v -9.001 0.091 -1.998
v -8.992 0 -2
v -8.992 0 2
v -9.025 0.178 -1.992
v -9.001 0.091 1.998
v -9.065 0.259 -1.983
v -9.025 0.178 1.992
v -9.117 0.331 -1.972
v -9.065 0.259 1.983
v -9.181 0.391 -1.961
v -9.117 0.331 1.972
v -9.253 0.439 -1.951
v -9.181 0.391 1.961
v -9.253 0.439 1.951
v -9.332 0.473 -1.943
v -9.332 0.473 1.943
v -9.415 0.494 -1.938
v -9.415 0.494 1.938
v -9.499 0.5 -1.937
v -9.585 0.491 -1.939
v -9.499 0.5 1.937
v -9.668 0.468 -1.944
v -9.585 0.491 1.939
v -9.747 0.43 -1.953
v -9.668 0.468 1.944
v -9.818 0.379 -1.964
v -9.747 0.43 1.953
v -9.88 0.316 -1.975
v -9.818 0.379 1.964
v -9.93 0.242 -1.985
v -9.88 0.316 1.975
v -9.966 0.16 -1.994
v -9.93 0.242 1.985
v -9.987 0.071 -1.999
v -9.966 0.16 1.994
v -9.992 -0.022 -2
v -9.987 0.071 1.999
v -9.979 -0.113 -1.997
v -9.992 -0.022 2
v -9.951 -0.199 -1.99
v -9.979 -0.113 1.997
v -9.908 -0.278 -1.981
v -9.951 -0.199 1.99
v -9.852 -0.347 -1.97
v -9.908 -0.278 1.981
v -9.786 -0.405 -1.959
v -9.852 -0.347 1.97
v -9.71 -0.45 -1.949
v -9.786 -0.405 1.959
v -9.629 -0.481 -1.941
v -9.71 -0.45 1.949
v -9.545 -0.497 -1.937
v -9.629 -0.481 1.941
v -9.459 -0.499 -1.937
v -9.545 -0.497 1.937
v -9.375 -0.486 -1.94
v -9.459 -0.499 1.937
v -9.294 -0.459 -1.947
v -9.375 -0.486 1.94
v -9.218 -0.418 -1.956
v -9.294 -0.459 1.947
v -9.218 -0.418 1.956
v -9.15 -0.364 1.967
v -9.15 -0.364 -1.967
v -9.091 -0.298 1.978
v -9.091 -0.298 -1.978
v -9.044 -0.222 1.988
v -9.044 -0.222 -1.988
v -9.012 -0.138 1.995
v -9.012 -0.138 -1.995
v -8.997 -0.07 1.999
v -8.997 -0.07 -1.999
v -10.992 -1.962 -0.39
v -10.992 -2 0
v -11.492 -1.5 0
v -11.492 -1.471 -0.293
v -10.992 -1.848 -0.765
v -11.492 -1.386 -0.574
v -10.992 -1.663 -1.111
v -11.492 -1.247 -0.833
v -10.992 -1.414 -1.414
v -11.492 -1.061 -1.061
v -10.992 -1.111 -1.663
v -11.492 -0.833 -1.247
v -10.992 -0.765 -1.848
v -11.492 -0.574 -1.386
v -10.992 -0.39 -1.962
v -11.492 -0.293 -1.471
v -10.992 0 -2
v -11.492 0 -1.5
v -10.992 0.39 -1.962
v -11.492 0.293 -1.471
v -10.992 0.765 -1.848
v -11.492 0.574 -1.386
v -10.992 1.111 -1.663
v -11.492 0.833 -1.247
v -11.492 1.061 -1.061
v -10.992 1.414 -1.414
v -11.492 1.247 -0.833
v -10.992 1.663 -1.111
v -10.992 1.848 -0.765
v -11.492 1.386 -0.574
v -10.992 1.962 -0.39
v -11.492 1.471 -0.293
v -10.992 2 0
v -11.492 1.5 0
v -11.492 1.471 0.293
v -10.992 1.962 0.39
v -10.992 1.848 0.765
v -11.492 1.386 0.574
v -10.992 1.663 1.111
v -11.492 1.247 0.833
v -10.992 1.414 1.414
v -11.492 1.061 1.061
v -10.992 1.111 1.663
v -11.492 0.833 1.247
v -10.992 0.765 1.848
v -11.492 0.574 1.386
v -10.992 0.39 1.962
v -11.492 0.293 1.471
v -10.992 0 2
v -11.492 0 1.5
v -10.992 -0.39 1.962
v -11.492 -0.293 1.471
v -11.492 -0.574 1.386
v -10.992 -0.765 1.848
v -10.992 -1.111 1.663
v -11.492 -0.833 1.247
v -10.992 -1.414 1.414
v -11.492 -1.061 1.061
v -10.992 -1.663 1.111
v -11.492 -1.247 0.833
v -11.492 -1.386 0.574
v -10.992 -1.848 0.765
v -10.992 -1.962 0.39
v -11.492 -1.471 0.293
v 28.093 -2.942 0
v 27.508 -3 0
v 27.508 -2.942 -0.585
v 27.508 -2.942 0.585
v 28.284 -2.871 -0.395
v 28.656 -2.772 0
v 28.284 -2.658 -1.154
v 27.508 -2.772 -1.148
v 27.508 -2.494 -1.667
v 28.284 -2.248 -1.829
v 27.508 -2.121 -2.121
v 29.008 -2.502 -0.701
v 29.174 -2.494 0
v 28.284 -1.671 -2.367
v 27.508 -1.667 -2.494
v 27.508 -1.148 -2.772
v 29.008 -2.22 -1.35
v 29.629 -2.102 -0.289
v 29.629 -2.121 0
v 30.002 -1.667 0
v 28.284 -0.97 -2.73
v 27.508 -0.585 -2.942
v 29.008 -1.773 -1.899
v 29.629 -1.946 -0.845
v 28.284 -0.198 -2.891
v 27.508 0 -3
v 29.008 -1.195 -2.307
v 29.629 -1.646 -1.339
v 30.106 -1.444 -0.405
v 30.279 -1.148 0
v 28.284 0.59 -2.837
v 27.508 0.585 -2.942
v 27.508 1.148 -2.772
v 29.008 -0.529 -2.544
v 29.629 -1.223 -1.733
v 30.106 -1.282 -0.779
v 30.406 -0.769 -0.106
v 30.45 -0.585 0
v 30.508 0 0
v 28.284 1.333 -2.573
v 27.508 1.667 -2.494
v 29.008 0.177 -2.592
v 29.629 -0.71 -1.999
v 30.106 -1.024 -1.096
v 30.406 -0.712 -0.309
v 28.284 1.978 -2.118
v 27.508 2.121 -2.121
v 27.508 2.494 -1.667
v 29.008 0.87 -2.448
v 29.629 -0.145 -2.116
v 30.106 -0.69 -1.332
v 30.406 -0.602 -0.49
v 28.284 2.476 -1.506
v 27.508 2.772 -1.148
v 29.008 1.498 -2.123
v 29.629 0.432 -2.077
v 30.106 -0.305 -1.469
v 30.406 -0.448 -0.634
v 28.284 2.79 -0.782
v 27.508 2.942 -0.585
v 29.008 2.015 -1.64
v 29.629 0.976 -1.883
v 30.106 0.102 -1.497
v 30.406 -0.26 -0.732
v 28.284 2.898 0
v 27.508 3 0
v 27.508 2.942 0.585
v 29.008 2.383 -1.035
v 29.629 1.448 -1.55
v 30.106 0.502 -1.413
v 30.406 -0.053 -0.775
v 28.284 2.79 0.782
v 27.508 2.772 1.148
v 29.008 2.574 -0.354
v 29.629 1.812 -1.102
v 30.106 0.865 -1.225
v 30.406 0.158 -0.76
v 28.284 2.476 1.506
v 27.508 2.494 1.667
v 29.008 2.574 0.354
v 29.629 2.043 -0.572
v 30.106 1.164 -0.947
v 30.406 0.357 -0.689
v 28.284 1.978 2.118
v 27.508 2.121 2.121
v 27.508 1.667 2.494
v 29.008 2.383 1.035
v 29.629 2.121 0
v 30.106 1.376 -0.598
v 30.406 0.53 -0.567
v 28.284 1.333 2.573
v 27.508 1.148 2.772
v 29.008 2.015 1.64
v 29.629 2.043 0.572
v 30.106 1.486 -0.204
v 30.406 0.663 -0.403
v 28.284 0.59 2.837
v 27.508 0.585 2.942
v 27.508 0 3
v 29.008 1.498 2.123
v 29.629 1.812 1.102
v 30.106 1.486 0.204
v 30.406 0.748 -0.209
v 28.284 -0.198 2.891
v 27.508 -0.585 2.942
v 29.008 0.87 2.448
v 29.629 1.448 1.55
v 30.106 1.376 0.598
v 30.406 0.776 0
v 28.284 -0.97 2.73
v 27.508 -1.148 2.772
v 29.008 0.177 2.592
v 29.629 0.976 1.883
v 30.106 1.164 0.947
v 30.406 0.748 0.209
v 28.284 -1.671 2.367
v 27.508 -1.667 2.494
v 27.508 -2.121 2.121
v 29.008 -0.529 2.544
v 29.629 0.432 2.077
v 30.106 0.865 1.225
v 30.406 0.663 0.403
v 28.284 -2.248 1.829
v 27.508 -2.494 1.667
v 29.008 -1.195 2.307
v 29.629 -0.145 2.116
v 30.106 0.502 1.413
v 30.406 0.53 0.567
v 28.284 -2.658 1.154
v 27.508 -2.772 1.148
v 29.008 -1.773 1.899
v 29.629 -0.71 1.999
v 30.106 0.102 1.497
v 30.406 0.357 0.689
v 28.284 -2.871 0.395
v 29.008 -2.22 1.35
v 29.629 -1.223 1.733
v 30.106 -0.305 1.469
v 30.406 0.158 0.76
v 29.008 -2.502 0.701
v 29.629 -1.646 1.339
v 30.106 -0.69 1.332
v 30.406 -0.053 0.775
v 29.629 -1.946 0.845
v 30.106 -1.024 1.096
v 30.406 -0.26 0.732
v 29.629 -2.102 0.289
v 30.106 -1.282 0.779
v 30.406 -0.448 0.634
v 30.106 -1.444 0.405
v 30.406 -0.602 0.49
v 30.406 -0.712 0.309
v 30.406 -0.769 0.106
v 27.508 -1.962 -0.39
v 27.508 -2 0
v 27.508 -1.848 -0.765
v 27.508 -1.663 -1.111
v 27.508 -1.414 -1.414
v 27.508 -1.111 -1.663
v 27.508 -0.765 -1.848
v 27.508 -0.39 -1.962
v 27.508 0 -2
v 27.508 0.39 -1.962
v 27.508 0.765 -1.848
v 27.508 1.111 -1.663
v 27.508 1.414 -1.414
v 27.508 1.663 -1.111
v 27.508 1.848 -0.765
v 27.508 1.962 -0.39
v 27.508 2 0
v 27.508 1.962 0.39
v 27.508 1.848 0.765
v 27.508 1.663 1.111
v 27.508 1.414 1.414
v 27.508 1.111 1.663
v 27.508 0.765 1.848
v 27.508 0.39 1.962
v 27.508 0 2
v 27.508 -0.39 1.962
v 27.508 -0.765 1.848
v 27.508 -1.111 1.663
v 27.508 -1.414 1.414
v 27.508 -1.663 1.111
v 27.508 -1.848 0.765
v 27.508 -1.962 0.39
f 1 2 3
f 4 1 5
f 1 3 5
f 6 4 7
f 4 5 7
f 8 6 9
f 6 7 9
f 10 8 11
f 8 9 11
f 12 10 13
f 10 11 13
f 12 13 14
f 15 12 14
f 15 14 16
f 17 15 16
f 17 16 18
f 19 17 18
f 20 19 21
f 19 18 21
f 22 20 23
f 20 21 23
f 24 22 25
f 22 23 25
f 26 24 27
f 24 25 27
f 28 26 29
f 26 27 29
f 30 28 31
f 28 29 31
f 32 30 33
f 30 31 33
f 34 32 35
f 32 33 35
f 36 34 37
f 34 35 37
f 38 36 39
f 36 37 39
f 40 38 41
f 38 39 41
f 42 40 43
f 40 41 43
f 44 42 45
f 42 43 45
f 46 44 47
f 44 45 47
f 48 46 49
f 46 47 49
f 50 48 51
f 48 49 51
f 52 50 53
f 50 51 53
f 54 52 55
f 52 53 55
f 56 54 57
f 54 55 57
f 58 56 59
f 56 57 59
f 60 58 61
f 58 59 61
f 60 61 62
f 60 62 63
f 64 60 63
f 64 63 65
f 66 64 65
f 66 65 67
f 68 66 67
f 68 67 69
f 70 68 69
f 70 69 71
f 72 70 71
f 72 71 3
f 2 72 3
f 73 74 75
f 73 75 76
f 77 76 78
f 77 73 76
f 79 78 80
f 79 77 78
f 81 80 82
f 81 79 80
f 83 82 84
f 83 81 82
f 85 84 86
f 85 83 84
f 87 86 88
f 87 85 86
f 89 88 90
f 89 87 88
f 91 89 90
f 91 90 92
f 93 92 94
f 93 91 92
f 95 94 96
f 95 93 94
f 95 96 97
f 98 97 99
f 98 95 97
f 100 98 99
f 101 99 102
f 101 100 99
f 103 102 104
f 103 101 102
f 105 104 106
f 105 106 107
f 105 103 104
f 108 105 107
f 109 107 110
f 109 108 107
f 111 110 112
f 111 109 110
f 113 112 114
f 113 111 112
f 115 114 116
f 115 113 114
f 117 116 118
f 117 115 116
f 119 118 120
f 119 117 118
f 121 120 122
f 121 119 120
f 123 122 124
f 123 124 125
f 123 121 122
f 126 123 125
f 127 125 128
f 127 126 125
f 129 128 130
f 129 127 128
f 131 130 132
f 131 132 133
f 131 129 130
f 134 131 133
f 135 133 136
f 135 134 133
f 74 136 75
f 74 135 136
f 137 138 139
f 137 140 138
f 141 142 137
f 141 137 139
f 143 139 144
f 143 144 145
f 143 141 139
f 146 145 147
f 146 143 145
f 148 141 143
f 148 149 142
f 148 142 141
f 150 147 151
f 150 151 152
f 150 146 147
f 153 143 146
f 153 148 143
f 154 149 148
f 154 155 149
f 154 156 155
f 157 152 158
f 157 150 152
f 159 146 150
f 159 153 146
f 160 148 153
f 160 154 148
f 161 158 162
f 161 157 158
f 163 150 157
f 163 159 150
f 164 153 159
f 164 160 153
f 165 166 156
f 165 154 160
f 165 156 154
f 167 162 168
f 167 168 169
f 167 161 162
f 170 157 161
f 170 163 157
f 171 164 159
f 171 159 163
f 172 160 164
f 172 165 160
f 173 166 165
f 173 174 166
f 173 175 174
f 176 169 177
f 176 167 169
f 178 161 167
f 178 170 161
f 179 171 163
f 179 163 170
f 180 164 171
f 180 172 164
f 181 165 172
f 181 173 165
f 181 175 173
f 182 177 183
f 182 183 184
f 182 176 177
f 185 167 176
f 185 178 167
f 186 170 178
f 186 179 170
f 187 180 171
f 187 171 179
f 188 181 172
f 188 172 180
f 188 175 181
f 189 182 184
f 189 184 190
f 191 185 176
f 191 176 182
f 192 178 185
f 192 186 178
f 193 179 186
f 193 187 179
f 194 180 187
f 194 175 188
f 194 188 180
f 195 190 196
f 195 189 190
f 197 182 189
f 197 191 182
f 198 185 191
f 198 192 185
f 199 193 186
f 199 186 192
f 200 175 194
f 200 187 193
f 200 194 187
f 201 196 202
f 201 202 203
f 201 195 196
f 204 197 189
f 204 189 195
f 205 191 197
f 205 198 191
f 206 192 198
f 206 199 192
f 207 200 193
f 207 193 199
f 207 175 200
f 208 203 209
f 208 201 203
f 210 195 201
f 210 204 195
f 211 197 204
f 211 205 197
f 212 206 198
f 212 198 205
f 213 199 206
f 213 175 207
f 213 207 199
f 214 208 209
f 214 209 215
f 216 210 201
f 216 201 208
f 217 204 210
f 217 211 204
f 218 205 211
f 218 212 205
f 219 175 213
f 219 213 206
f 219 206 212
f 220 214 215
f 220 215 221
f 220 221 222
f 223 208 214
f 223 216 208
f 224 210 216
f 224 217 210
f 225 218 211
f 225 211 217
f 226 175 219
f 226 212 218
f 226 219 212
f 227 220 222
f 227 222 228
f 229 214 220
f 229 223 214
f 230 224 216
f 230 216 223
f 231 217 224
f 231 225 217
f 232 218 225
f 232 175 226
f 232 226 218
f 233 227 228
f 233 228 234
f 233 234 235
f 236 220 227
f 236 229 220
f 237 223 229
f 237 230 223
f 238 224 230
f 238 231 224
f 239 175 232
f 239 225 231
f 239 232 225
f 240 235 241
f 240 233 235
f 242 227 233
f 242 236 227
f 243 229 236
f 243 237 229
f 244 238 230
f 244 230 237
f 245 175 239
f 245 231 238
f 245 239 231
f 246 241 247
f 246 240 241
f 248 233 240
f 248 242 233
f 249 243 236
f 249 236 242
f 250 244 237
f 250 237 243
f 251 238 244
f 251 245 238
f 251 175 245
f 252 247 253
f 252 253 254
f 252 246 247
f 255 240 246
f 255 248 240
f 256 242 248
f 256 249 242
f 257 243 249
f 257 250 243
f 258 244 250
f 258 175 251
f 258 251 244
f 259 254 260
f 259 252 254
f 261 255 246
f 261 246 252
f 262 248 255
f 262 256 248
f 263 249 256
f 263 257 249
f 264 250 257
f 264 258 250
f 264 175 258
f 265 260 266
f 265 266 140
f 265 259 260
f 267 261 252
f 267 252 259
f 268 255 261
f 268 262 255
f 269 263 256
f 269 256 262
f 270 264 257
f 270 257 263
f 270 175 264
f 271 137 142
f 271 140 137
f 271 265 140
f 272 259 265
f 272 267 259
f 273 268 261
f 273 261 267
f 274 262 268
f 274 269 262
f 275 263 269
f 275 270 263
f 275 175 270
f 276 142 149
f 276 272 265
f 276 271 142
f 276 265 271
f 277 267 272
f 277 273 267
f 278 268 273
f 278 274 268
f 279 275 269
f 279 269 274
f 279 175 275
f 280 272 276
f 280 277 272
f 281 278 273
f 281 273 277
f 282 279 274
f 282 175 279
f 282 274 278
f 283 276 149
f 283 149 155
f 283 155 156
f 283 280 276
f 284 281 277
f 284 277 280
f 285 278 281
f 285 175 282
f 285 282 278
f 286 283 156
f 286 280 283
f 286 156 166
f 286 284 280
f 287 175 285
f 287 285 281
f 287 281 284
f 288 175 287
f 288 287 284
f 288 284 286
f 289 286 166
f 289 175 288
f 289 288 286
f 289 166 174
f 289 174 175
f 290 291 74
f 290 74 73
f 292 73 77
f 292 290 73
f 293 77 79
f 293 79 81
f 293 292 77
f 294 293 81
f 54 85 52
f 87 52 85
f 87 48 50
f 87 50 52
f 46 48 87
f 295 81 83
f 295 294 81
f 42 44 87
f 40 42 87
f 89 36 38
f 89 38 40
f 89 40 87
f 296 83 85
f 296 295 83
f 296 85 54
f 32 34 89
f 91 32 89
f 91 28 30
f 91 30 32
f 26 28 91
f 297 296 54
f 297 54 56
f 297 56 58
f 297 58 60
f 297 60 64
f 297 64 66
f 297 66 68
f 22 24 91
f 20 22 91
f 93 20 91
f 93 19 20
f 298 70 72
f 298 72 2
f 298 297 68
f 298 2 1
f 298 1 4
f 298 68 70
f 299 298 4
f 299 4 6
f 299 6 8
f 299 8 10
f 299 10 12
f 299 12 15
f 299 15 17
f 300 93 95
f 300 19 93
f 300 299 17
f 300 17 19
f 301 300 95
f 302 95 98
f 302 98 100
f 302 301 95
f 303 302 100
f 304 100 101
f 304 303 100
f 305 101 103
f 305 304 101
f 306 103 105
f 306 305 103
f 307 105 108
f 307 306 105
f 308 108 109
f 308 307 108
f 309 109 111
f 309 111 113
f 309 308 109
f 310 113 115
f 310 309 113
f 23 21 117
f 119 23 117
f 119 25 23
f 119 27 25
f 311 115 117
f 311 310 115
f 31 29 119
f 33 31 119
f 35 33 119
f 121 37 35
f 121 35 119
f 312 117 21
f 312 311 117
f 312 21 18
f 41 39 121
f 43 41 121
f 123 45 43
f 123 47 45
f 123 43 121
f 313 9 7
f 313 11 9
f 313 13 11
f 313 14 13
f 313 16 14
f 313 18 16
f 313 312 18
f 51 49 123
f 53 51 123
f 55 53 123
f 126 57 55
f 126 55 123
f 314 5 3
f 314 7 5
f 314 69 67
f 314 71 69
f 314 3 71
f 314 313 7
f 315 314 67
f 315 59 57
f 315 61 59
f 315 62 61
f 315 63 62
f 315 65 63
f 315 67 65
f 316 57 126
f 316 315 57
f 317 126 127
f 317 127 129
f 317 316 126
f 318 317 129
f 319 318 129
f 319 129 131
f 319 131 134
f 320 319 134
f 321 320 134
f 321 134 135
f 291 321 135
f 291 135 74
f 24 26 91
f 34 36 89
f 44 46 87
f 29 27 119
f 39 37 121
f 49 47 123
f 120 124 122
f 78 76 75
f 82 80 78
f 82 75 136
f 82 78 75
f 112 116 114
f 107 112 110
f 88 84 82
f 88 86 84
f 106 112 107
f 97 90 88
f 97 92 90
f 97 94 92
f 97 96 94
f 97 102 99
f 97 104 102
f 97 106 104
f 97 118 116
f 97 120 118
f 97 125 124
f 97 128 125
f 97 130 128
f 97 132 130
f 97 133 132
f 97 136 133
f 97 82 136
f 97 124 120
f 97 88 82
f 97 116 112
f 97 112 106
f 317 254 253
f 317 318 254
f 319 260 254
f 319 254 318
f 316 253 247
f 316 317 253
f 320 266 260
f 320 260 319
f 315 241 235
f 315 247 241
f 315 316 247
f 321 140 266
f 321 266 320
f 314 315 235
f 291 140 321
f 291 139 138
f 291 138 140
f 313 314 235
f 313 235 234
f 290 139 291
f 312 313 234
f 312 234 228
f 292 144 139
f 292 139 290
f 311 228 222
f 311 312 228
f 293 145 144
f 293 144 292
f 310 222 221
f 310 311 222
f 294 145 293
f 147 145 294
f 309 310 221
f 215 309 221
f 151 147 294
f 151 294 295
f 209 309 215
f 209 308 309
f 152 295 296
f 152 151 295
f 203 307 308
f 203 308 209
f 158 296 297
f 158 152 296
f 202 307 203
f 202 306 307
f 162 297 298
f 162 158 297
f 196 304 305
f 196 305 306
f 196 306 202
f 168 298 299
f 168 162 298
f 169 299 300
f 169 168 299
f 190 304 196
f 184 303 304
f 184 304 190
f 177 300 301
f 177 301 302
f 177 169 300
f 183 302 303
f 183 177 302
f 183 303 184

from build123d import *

# Parameters (mm, degrees)
SKETCH2_R          = 0.5
CUT_EXTRUDE1_DEPTH = 5
CHAMFER1_SIZE      = 0.5


with BuildPart() as part:
    # Sketch1 → Revolve1 (revolve)
    with BuildSketch(Plane.XY):
        with BuildLine():
            Line((-11.492242367, 0), (-11.492242367, -2))
            Line((-11.492242367, -2), (27.507757633, -2))
            Line((27.507757633, -2), (27.507757633, -3))
            ThreePointArc((27.507757633, -3), (29.629077976, -2.121320344), (30.507757633, 0))
            Line((30.507757633, 0), (-11.492242367, 0))
        make_face()
    revolve(axis=Axis((-20.421686747, 0, 0), (1, 0, 0)))

    # Sketch2 → Cut-Extrude1 (cut, symmetric)
    with BuildSketch(Plane.XY):
        with Locations((-9.492242367, 0)):
            Circle(SKETCH2_R)
    extrude(amount=CUT_EXTRUDE1_DEPTH, both=True, mode=Mode.SUBTRACT)

    # Chamfer1
    chamfer1_edges = [part.edges().sort_by_distance(p)[0] for p in [
        (-11.492242367, 2, 0),
    ]]
    chamfer(chamfer1_edges, length=CHAMFER1_SIZE)


solid = part.part
